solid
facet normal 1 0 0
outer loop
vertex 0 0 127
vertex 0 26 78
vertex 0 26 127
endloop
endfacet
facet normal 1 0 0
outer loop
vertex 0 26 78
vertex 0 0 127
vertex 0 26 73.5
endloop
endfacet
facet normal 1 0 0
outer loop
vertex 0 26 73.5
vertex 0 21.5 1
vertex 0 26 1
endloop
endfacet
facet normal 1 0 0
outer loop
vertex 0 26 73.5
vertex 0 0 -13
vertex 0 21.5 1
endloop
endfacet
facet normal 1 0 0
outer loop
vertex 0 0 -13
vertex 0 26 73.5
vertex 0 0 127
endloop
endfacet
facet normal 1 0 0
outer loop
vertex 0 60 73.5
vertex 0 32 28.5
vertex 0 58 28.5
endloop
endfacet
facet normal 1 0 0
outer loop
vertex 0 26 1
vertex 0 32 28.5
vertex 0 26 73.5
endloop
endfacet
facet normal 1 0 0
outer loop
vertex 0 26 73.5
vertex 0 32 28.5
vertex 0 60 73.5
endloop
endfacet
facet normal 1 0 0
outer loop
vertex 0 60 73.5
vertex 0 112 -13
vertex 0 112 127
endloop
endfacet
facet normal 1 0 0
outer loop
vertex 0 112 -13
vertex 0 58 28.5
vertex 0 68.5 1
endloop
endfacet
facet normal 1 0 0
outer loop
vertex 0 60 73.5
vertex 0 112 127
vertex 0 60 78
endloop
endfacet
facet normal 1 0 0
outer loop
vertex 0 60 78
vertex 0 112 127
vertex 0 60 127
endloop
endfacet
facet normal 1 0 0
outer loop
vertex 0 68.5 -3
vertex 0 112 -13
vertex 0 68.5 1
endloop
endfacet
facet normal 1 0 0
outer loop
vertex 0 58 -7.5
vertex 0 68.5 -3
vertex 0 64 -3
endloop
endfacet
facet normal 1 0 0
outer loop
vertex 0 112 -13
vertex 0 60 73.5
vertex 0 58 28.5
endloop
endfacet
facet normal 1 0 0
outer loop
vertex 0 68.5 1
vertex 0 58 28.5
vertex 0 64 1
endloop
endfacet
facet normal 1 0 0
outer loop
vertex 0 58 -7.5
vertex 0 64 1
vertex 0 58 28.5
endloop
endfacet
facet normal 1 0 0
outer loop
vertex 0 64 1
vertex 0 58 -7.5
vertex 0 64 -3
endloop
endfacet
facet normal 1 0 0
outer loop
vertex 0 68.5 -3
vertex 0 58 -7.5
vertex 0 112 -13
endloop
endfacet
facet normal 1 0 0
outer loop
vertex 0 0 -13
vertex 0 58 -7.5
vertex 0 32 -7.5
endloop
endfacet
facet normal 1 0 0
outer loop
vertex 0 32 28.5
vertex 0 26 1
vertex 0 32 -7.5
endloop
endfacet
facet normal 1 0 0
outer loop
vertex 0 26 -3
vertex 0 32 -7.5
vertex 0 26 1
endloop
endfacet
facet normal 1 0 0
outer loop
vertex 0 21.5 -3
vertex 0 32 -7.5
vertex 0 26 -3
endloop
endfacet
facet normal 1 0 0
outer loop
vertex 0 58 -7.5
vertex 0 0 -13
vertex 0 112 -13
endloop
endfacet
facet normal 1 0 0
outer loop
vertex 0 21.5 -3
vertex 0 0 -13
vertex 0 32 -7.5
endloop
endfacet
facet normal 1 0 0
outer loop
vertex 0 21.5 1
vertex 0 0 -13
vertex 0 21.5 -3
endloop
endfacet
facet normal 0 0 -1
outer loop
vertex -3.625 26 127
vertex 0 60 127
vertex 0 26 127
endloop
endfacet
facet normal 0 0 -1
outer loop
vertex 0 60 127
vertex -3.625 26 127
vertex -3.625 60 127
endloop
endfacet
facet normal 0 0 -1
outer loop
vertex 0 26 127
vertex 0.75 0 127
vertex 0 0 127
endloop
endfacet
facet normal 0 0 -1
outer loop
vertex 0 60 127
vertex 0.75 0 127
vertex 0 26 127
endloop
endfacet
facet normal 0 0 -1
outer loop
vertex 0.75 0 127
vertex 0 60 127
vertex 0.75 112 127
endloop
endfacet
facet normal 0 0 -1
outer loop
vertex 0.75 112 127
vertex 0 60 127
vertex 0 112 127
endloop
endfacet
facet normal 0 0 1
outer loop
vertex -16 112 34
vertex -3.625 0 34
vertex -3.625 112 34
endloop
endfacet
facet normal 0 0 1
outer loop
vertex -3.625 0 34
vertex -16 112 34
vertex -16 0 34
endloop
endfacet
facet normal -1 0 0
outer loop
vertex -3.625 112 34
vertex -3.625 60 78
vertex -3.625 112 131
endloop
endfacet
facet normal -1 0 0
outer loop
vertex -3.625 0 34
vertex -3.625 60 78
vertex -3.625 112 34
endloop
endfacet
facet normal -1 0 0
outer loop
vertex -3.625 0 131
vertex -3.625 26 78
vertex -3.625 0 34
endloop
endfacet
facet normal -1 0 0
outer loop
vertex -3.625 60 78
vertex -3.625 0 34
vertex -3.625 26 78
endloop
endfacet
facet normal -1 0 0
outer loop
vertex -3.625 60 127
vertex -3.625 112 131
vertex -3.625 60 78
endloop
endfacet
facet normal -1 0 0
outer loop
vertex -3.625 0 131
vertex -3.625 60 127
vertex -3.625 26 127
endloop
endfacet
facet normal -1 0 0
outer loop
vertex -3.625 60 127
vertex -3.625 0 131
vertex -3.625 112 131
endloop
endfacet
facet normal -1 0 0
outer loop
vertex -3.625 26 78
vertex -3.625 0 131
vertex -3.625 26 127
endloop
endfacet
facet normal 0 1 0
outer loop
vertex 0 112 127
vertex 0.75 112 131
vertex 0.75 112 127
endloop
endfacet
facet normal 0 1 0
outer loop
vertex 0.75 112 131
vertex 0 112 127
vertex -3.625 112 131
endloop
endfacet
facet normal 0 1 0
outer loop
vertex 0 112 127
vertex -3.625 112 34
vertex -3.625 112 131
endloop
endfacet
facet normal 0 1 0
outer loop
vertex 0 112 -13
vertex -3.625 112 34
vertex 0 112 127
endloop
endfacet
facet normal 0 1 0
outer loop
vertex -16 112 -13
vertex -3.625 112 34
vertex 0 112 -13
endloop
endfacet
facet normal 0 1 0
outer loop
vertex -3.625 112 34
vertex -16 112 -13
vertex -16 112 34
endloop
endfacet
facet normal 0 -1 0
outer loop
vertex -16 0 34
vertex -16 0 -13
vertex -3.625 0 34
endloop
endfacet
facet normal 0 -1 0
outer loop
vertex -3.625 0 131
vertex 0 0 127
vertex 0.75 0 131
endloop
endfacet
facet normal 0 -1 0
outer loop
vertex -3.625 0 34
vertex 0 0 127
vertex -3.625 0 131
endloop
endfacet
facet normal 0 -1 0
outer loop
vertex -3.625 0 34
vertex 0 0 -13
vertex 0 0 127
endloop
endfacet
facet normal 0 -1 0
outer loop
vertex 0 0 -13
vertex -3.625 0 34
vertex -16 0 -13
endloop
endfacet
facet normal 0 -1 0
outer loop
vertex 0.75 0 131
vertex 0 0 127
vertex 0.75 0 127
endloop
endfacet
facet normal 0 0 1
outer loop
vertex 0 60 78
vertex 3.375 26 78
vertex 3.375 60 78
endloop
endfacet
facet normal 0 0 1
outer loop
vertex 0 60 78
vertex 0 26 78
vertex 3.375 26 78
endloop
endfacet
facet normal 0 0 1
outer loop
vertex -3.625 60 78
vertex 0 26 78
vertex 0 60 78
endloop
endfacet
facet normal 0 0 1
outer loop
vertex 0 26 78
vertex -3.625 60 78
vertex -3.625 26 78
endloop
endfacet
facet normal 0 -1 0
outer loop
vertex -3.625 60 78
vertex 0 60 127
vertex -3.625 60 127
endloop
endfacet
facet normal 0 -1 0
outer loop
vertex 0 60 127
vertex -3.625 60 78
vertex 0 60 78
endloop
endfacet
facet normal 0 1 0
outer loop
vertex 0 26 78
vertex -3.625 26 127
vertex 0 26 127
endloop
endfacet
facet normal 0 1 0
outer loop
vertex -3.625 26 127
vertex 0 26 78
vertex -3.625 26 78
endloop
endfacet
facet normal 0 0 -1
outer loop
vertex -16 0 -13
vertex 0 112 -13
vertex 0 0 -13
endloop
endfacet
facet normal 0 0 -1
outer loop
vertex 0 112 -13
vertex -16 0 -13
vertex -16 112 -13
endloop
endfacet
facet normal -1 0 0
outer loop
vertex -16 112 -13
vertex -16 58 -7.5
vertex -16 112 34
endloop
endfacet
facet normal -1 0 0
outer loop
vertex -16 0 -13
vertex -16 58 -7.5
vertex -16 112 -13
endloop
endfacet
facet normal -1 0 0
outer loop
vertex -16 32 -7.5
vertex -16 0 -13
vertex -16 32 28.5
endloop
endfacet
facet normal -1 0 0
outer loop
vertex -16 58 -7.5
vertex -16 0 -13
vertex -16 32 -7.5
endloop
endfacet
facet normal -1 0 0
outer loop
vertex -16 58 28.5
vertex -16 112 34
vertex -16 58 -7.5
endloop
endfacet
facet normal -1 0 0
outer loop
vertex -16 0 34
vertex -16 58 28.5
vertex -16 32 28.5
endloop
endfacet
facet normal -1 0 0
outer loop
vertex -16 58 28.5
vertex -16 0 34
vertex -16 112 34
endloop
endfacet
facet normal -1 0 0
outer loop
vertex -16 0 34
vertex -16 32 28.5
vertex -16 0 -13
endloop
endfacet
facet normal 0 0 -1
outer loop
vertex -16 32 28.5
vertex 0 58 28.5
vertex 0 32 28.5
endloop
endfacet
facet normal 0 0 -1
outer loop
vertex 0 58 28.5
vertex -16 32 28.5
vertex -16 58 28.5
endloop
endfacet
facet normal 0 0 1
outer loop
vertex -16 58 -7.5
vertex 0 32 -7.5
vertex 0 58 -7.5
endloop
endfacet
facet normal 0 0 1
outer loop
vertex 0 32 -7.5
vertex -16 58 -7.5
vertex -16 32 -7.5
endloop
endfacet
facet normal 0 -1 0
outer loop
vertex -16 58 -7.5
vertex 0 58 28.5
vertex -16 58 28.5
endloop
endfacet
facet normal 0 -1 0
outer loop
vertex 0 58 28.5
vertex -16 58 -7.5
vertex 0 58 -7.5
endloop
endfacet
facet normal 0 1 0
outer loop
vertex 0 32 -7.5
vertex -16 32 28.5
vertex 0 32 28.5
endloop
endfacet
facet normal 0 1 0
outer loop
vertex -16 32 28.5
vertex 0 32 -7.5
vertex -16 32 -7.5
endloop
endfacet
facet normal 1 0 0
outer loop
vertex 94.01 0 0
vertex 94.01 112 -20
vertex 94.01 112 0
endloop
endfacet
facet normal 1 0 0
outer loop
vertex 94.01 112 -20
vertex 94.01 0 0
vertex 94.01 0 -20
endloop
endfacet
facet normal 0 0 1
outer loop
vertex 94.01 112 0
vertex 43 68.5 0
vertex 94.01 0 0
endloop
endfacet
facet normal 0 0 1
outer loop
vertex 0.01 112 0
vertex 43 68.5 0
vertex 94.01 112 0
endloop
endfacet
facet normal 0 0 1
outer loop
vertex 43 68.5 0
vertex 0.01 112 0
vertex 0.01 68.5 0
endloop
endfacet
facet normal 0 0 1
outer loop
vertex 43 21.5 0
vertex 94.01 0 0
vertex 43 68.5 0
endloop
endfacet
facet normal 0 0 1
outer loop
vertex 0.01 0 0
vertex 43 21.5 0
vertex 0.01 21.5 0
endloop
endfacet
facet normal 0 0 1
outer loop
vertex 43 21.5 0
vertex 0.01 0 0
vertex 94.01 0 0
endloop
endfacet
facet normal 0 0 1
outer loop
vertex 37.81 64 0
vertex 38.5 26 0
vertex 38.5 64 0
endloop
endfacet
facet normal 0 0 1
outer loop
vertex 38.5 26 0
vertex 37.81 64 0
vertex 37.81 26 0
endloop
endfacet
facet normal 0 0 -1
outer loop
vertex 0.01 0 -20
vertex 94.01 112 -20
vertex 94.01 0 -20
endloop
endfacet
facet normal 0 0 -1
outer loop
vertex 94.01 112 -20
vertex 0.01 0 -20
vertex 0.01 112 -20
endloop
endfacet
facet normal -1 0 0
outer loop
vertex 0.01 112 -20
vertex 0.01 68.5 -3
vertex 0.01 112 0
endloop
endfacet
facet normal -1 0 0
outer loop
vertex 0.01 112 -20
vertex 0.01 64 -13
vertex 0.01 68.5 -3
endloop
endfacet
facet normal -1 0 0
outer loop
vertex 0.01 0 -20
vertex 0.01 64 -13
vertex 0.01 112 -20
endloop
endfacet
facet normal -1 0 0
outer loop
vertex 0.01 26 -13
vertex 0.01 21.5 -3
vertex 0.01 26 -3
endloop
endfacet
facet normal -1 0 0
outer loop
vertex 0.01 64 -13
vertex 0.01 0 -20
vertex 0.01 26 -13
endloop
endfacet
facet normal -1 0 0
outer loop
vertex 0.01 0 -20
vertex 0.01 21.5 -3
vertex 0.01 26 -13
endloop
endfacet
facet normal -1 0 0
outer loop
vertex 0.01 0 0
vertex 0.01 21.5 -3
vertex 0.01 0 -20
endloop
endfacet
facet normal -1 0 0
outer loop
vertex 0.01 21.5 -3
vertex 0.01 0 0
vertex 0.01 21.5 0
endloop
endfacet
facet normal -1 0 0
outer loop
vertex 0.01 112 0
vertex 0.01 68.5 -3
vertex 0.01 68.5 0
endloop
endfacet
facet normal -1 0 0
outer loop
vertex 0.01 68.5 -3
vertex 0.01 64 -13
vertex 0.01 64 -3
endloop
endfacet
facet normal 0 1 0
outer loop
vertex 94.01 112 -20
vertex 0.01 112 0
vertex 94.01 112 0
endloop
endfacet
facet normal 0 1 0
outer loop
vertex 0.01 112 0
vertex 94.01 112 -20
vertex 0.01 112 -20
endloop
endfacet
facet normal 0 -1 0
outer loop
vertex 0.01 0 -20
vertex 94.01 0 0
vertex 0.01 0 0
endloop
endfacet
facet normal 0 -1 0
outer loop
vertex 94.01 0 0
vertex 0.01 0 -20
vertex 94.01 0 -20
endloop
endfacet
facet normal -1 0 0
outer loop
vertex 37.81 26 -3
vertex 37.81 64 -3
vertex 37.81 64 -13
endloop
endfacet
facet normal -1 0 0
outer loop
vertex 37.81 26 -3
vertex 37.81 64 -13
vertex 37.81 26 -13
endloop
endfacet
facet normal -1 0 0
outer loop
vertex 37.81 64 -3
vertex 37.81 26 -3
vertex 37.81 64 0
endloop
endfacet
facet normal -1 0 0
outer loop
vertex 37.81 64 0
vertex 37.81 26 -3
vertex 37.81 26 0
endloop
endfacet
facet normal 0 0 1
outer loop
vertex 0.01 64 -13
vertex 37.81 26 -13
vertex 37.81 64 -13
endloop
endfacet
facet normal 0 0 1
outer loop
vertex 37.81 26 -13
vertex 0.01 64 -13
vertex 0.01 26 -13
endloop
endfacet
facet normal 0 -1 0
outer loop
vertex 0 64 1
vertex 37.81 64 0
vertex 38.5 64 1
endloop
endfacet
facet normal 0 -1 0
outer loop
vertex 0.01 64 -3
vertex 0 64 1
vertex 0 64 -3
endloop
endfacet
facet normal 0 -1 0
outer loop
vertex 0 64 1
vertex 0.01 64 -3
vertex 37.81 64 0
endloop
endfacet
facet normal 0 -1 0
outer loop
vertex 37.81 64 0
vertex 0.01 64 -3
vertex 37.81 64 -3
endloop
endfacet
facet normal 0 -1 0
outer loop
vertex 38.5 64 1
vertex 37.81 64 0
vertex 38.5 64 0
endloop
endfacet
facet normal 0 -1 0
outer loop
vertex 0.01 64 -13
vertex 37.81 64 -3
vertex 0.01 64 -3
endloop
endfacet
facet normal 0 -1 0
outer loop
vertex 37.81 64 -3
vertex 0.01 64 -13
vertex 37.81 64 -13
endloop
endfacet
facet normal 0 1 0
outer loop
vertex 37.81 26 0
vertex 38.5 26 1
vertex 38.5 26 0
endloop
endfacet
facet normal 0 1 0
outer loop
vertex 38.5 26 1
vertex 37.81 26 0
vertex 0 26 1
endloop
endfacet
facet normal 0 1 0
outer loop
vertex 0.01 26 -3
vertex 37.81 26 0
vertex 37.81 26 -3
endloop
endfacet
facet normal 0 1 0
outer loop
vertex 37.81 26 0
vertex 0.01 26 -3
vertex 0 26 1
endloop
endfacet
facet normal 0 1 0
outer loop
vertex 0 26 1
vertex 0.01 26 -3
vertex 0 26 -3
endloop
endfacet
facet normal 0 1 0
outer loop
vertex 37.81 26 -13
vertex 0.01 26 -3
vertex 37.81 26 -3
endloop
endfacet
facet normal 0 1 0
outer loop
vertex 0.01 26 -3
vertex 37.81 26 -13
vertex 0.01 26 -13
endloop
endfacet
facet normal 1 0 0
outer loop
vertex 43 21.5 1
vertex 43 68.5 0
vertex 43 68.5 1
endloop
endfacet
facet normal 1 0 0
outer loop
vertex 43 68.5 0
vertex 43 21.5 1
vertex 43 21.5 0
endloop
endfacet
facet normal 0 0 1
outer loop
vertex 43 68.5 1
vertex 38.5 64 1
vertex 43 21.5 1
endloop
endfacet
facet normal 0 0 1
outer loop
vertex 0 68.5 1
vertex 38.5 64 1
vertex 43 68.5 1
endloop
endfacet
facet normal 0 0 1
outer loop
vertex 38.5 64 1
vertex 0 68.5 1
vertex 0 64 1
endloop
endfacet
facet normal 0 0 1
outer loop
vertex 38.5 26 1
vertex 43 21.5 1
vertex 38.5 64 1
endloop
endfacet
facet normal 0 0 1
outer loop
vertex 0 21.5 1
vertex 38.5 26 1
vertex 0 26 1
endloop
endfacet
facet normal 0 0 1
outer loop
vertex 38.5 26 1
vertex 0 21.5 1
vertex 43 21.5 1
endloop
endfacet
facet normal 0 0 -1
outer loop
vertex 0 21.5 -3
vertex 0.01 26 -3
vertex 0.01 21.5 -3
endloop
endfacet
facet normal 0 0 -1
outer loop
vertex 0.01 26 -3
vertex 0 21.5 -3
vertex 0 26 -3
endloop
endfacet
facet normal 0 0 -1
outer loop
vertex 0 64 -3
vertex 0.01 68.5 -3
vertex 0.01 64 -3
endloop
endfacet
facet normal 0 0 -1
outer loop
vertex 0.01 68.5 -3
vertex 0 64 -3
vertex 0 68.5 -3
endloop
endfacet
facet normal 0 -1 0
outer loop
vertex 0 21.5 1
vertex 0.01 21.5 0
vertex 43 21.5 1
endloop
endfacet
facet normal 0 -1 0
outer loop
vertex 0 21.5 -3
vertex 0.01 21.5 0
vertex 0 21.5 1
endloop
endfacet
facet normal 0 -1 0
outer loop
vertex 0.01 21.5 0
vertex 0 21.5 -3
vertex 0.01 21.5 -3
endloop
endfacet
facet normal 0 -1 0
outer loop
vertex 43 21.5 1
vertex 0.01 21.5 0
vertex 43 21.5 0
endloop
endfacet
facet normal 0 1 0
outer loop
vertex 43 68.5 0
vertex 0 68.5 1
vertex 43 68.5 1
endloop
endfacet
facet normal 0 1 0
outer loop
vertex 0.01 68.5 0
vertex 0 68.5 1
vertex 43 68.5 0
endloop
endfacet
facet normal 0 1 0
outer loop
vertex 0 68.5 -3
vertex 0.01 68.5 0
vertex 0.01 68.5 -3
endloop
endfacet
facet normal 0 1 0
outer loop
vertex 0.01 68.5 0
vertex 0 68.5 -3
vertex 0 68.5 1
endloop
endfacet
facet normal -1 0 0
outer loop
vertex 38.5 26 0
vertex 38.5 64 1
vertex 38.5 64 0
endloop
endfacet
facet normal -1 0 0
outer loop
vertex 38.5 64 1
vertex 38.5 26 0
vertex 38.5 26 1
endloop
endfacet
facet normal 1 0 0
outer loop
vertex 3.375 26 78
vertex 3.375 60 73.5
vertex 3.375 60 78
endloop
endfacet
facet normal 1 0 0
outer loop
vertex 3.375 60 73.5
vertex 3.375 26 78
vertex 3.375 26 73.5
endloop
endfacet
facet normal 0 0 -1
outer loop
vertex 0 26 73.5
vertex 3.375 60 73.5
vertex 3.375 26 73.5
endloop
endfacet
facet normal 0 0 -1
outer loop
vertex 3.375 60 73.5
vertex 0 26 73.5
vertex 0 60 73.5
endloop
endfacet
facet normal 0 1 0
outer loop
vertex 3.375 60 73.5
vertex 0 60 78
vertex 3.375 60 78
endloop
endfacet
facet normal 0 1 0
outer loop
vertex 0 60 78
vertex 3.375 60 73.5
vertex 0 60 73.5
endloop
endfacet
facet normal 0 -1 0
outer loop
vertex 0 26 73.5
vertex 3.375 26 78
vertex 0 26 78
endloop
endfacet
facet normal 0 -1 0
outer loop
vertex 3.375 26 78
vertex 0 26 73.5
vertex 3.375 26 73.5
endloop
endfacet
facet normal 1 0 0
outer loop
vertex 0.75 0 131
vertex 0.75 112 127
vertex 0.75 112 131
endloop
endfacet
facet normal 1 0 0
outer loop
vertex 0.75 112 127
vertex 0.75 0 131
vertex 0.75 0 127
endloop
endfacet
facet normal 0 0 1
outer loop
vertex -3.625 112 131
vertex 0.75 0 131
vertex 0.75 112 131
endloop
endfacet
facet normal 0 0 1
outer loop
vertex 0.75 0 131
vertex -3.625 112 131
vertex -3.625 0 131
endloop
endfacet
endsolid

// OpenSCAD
/*
 * Partial North Wall
 * 1 = 1 inch
 */
 
// brick wall
brickdepth = 3.625;
difference() {
    color("red")
        translate([-brickdepth, 0, 34])
            cube([brickdepth, 112, 93]);

    translate([-brickdepth - 0.1, 26, 78])
        cube([brickdepth + 0.2, 34, 49.5]);
}

// Window base
color("red")
    translate([-brickdepth, 26, 73.5])
        cube([7, 34, 4.5]);


// trim
color("white")
    translate([-brickdepth, 0, 127])
        cube([brickdepth + 0.75, 112, 4]);

// foundation
concretedepth = 16;
difference() {
    color("lightgrey")
        translate([-concretedepth, 0, -13])
            cube([concretedepth, 112, 47]);

    translate([-concretedepth - 0.1, 32, -7.5])
        cube([concretedepth + 0.2, 26, 36]);
}

// earth
translate([0.01,0,0])
difference() {
    color([0.62, 0.32, 0.18, 0.50])
        translate([0, 0, -20])
            cube([94, 112, 20]);

    translate([-0.2, 26, -13])
        cube([38, 38, 13 + 0.1]);
}

// Window well brick
color("darkgrey") {
    for (y = [21.5, 64])
        translate([0, y, -3])
            cube([43, 4.5, 4]);

    translate([38.5, 21.5, -3])
        cube([4.5, 47, 4]);
}
